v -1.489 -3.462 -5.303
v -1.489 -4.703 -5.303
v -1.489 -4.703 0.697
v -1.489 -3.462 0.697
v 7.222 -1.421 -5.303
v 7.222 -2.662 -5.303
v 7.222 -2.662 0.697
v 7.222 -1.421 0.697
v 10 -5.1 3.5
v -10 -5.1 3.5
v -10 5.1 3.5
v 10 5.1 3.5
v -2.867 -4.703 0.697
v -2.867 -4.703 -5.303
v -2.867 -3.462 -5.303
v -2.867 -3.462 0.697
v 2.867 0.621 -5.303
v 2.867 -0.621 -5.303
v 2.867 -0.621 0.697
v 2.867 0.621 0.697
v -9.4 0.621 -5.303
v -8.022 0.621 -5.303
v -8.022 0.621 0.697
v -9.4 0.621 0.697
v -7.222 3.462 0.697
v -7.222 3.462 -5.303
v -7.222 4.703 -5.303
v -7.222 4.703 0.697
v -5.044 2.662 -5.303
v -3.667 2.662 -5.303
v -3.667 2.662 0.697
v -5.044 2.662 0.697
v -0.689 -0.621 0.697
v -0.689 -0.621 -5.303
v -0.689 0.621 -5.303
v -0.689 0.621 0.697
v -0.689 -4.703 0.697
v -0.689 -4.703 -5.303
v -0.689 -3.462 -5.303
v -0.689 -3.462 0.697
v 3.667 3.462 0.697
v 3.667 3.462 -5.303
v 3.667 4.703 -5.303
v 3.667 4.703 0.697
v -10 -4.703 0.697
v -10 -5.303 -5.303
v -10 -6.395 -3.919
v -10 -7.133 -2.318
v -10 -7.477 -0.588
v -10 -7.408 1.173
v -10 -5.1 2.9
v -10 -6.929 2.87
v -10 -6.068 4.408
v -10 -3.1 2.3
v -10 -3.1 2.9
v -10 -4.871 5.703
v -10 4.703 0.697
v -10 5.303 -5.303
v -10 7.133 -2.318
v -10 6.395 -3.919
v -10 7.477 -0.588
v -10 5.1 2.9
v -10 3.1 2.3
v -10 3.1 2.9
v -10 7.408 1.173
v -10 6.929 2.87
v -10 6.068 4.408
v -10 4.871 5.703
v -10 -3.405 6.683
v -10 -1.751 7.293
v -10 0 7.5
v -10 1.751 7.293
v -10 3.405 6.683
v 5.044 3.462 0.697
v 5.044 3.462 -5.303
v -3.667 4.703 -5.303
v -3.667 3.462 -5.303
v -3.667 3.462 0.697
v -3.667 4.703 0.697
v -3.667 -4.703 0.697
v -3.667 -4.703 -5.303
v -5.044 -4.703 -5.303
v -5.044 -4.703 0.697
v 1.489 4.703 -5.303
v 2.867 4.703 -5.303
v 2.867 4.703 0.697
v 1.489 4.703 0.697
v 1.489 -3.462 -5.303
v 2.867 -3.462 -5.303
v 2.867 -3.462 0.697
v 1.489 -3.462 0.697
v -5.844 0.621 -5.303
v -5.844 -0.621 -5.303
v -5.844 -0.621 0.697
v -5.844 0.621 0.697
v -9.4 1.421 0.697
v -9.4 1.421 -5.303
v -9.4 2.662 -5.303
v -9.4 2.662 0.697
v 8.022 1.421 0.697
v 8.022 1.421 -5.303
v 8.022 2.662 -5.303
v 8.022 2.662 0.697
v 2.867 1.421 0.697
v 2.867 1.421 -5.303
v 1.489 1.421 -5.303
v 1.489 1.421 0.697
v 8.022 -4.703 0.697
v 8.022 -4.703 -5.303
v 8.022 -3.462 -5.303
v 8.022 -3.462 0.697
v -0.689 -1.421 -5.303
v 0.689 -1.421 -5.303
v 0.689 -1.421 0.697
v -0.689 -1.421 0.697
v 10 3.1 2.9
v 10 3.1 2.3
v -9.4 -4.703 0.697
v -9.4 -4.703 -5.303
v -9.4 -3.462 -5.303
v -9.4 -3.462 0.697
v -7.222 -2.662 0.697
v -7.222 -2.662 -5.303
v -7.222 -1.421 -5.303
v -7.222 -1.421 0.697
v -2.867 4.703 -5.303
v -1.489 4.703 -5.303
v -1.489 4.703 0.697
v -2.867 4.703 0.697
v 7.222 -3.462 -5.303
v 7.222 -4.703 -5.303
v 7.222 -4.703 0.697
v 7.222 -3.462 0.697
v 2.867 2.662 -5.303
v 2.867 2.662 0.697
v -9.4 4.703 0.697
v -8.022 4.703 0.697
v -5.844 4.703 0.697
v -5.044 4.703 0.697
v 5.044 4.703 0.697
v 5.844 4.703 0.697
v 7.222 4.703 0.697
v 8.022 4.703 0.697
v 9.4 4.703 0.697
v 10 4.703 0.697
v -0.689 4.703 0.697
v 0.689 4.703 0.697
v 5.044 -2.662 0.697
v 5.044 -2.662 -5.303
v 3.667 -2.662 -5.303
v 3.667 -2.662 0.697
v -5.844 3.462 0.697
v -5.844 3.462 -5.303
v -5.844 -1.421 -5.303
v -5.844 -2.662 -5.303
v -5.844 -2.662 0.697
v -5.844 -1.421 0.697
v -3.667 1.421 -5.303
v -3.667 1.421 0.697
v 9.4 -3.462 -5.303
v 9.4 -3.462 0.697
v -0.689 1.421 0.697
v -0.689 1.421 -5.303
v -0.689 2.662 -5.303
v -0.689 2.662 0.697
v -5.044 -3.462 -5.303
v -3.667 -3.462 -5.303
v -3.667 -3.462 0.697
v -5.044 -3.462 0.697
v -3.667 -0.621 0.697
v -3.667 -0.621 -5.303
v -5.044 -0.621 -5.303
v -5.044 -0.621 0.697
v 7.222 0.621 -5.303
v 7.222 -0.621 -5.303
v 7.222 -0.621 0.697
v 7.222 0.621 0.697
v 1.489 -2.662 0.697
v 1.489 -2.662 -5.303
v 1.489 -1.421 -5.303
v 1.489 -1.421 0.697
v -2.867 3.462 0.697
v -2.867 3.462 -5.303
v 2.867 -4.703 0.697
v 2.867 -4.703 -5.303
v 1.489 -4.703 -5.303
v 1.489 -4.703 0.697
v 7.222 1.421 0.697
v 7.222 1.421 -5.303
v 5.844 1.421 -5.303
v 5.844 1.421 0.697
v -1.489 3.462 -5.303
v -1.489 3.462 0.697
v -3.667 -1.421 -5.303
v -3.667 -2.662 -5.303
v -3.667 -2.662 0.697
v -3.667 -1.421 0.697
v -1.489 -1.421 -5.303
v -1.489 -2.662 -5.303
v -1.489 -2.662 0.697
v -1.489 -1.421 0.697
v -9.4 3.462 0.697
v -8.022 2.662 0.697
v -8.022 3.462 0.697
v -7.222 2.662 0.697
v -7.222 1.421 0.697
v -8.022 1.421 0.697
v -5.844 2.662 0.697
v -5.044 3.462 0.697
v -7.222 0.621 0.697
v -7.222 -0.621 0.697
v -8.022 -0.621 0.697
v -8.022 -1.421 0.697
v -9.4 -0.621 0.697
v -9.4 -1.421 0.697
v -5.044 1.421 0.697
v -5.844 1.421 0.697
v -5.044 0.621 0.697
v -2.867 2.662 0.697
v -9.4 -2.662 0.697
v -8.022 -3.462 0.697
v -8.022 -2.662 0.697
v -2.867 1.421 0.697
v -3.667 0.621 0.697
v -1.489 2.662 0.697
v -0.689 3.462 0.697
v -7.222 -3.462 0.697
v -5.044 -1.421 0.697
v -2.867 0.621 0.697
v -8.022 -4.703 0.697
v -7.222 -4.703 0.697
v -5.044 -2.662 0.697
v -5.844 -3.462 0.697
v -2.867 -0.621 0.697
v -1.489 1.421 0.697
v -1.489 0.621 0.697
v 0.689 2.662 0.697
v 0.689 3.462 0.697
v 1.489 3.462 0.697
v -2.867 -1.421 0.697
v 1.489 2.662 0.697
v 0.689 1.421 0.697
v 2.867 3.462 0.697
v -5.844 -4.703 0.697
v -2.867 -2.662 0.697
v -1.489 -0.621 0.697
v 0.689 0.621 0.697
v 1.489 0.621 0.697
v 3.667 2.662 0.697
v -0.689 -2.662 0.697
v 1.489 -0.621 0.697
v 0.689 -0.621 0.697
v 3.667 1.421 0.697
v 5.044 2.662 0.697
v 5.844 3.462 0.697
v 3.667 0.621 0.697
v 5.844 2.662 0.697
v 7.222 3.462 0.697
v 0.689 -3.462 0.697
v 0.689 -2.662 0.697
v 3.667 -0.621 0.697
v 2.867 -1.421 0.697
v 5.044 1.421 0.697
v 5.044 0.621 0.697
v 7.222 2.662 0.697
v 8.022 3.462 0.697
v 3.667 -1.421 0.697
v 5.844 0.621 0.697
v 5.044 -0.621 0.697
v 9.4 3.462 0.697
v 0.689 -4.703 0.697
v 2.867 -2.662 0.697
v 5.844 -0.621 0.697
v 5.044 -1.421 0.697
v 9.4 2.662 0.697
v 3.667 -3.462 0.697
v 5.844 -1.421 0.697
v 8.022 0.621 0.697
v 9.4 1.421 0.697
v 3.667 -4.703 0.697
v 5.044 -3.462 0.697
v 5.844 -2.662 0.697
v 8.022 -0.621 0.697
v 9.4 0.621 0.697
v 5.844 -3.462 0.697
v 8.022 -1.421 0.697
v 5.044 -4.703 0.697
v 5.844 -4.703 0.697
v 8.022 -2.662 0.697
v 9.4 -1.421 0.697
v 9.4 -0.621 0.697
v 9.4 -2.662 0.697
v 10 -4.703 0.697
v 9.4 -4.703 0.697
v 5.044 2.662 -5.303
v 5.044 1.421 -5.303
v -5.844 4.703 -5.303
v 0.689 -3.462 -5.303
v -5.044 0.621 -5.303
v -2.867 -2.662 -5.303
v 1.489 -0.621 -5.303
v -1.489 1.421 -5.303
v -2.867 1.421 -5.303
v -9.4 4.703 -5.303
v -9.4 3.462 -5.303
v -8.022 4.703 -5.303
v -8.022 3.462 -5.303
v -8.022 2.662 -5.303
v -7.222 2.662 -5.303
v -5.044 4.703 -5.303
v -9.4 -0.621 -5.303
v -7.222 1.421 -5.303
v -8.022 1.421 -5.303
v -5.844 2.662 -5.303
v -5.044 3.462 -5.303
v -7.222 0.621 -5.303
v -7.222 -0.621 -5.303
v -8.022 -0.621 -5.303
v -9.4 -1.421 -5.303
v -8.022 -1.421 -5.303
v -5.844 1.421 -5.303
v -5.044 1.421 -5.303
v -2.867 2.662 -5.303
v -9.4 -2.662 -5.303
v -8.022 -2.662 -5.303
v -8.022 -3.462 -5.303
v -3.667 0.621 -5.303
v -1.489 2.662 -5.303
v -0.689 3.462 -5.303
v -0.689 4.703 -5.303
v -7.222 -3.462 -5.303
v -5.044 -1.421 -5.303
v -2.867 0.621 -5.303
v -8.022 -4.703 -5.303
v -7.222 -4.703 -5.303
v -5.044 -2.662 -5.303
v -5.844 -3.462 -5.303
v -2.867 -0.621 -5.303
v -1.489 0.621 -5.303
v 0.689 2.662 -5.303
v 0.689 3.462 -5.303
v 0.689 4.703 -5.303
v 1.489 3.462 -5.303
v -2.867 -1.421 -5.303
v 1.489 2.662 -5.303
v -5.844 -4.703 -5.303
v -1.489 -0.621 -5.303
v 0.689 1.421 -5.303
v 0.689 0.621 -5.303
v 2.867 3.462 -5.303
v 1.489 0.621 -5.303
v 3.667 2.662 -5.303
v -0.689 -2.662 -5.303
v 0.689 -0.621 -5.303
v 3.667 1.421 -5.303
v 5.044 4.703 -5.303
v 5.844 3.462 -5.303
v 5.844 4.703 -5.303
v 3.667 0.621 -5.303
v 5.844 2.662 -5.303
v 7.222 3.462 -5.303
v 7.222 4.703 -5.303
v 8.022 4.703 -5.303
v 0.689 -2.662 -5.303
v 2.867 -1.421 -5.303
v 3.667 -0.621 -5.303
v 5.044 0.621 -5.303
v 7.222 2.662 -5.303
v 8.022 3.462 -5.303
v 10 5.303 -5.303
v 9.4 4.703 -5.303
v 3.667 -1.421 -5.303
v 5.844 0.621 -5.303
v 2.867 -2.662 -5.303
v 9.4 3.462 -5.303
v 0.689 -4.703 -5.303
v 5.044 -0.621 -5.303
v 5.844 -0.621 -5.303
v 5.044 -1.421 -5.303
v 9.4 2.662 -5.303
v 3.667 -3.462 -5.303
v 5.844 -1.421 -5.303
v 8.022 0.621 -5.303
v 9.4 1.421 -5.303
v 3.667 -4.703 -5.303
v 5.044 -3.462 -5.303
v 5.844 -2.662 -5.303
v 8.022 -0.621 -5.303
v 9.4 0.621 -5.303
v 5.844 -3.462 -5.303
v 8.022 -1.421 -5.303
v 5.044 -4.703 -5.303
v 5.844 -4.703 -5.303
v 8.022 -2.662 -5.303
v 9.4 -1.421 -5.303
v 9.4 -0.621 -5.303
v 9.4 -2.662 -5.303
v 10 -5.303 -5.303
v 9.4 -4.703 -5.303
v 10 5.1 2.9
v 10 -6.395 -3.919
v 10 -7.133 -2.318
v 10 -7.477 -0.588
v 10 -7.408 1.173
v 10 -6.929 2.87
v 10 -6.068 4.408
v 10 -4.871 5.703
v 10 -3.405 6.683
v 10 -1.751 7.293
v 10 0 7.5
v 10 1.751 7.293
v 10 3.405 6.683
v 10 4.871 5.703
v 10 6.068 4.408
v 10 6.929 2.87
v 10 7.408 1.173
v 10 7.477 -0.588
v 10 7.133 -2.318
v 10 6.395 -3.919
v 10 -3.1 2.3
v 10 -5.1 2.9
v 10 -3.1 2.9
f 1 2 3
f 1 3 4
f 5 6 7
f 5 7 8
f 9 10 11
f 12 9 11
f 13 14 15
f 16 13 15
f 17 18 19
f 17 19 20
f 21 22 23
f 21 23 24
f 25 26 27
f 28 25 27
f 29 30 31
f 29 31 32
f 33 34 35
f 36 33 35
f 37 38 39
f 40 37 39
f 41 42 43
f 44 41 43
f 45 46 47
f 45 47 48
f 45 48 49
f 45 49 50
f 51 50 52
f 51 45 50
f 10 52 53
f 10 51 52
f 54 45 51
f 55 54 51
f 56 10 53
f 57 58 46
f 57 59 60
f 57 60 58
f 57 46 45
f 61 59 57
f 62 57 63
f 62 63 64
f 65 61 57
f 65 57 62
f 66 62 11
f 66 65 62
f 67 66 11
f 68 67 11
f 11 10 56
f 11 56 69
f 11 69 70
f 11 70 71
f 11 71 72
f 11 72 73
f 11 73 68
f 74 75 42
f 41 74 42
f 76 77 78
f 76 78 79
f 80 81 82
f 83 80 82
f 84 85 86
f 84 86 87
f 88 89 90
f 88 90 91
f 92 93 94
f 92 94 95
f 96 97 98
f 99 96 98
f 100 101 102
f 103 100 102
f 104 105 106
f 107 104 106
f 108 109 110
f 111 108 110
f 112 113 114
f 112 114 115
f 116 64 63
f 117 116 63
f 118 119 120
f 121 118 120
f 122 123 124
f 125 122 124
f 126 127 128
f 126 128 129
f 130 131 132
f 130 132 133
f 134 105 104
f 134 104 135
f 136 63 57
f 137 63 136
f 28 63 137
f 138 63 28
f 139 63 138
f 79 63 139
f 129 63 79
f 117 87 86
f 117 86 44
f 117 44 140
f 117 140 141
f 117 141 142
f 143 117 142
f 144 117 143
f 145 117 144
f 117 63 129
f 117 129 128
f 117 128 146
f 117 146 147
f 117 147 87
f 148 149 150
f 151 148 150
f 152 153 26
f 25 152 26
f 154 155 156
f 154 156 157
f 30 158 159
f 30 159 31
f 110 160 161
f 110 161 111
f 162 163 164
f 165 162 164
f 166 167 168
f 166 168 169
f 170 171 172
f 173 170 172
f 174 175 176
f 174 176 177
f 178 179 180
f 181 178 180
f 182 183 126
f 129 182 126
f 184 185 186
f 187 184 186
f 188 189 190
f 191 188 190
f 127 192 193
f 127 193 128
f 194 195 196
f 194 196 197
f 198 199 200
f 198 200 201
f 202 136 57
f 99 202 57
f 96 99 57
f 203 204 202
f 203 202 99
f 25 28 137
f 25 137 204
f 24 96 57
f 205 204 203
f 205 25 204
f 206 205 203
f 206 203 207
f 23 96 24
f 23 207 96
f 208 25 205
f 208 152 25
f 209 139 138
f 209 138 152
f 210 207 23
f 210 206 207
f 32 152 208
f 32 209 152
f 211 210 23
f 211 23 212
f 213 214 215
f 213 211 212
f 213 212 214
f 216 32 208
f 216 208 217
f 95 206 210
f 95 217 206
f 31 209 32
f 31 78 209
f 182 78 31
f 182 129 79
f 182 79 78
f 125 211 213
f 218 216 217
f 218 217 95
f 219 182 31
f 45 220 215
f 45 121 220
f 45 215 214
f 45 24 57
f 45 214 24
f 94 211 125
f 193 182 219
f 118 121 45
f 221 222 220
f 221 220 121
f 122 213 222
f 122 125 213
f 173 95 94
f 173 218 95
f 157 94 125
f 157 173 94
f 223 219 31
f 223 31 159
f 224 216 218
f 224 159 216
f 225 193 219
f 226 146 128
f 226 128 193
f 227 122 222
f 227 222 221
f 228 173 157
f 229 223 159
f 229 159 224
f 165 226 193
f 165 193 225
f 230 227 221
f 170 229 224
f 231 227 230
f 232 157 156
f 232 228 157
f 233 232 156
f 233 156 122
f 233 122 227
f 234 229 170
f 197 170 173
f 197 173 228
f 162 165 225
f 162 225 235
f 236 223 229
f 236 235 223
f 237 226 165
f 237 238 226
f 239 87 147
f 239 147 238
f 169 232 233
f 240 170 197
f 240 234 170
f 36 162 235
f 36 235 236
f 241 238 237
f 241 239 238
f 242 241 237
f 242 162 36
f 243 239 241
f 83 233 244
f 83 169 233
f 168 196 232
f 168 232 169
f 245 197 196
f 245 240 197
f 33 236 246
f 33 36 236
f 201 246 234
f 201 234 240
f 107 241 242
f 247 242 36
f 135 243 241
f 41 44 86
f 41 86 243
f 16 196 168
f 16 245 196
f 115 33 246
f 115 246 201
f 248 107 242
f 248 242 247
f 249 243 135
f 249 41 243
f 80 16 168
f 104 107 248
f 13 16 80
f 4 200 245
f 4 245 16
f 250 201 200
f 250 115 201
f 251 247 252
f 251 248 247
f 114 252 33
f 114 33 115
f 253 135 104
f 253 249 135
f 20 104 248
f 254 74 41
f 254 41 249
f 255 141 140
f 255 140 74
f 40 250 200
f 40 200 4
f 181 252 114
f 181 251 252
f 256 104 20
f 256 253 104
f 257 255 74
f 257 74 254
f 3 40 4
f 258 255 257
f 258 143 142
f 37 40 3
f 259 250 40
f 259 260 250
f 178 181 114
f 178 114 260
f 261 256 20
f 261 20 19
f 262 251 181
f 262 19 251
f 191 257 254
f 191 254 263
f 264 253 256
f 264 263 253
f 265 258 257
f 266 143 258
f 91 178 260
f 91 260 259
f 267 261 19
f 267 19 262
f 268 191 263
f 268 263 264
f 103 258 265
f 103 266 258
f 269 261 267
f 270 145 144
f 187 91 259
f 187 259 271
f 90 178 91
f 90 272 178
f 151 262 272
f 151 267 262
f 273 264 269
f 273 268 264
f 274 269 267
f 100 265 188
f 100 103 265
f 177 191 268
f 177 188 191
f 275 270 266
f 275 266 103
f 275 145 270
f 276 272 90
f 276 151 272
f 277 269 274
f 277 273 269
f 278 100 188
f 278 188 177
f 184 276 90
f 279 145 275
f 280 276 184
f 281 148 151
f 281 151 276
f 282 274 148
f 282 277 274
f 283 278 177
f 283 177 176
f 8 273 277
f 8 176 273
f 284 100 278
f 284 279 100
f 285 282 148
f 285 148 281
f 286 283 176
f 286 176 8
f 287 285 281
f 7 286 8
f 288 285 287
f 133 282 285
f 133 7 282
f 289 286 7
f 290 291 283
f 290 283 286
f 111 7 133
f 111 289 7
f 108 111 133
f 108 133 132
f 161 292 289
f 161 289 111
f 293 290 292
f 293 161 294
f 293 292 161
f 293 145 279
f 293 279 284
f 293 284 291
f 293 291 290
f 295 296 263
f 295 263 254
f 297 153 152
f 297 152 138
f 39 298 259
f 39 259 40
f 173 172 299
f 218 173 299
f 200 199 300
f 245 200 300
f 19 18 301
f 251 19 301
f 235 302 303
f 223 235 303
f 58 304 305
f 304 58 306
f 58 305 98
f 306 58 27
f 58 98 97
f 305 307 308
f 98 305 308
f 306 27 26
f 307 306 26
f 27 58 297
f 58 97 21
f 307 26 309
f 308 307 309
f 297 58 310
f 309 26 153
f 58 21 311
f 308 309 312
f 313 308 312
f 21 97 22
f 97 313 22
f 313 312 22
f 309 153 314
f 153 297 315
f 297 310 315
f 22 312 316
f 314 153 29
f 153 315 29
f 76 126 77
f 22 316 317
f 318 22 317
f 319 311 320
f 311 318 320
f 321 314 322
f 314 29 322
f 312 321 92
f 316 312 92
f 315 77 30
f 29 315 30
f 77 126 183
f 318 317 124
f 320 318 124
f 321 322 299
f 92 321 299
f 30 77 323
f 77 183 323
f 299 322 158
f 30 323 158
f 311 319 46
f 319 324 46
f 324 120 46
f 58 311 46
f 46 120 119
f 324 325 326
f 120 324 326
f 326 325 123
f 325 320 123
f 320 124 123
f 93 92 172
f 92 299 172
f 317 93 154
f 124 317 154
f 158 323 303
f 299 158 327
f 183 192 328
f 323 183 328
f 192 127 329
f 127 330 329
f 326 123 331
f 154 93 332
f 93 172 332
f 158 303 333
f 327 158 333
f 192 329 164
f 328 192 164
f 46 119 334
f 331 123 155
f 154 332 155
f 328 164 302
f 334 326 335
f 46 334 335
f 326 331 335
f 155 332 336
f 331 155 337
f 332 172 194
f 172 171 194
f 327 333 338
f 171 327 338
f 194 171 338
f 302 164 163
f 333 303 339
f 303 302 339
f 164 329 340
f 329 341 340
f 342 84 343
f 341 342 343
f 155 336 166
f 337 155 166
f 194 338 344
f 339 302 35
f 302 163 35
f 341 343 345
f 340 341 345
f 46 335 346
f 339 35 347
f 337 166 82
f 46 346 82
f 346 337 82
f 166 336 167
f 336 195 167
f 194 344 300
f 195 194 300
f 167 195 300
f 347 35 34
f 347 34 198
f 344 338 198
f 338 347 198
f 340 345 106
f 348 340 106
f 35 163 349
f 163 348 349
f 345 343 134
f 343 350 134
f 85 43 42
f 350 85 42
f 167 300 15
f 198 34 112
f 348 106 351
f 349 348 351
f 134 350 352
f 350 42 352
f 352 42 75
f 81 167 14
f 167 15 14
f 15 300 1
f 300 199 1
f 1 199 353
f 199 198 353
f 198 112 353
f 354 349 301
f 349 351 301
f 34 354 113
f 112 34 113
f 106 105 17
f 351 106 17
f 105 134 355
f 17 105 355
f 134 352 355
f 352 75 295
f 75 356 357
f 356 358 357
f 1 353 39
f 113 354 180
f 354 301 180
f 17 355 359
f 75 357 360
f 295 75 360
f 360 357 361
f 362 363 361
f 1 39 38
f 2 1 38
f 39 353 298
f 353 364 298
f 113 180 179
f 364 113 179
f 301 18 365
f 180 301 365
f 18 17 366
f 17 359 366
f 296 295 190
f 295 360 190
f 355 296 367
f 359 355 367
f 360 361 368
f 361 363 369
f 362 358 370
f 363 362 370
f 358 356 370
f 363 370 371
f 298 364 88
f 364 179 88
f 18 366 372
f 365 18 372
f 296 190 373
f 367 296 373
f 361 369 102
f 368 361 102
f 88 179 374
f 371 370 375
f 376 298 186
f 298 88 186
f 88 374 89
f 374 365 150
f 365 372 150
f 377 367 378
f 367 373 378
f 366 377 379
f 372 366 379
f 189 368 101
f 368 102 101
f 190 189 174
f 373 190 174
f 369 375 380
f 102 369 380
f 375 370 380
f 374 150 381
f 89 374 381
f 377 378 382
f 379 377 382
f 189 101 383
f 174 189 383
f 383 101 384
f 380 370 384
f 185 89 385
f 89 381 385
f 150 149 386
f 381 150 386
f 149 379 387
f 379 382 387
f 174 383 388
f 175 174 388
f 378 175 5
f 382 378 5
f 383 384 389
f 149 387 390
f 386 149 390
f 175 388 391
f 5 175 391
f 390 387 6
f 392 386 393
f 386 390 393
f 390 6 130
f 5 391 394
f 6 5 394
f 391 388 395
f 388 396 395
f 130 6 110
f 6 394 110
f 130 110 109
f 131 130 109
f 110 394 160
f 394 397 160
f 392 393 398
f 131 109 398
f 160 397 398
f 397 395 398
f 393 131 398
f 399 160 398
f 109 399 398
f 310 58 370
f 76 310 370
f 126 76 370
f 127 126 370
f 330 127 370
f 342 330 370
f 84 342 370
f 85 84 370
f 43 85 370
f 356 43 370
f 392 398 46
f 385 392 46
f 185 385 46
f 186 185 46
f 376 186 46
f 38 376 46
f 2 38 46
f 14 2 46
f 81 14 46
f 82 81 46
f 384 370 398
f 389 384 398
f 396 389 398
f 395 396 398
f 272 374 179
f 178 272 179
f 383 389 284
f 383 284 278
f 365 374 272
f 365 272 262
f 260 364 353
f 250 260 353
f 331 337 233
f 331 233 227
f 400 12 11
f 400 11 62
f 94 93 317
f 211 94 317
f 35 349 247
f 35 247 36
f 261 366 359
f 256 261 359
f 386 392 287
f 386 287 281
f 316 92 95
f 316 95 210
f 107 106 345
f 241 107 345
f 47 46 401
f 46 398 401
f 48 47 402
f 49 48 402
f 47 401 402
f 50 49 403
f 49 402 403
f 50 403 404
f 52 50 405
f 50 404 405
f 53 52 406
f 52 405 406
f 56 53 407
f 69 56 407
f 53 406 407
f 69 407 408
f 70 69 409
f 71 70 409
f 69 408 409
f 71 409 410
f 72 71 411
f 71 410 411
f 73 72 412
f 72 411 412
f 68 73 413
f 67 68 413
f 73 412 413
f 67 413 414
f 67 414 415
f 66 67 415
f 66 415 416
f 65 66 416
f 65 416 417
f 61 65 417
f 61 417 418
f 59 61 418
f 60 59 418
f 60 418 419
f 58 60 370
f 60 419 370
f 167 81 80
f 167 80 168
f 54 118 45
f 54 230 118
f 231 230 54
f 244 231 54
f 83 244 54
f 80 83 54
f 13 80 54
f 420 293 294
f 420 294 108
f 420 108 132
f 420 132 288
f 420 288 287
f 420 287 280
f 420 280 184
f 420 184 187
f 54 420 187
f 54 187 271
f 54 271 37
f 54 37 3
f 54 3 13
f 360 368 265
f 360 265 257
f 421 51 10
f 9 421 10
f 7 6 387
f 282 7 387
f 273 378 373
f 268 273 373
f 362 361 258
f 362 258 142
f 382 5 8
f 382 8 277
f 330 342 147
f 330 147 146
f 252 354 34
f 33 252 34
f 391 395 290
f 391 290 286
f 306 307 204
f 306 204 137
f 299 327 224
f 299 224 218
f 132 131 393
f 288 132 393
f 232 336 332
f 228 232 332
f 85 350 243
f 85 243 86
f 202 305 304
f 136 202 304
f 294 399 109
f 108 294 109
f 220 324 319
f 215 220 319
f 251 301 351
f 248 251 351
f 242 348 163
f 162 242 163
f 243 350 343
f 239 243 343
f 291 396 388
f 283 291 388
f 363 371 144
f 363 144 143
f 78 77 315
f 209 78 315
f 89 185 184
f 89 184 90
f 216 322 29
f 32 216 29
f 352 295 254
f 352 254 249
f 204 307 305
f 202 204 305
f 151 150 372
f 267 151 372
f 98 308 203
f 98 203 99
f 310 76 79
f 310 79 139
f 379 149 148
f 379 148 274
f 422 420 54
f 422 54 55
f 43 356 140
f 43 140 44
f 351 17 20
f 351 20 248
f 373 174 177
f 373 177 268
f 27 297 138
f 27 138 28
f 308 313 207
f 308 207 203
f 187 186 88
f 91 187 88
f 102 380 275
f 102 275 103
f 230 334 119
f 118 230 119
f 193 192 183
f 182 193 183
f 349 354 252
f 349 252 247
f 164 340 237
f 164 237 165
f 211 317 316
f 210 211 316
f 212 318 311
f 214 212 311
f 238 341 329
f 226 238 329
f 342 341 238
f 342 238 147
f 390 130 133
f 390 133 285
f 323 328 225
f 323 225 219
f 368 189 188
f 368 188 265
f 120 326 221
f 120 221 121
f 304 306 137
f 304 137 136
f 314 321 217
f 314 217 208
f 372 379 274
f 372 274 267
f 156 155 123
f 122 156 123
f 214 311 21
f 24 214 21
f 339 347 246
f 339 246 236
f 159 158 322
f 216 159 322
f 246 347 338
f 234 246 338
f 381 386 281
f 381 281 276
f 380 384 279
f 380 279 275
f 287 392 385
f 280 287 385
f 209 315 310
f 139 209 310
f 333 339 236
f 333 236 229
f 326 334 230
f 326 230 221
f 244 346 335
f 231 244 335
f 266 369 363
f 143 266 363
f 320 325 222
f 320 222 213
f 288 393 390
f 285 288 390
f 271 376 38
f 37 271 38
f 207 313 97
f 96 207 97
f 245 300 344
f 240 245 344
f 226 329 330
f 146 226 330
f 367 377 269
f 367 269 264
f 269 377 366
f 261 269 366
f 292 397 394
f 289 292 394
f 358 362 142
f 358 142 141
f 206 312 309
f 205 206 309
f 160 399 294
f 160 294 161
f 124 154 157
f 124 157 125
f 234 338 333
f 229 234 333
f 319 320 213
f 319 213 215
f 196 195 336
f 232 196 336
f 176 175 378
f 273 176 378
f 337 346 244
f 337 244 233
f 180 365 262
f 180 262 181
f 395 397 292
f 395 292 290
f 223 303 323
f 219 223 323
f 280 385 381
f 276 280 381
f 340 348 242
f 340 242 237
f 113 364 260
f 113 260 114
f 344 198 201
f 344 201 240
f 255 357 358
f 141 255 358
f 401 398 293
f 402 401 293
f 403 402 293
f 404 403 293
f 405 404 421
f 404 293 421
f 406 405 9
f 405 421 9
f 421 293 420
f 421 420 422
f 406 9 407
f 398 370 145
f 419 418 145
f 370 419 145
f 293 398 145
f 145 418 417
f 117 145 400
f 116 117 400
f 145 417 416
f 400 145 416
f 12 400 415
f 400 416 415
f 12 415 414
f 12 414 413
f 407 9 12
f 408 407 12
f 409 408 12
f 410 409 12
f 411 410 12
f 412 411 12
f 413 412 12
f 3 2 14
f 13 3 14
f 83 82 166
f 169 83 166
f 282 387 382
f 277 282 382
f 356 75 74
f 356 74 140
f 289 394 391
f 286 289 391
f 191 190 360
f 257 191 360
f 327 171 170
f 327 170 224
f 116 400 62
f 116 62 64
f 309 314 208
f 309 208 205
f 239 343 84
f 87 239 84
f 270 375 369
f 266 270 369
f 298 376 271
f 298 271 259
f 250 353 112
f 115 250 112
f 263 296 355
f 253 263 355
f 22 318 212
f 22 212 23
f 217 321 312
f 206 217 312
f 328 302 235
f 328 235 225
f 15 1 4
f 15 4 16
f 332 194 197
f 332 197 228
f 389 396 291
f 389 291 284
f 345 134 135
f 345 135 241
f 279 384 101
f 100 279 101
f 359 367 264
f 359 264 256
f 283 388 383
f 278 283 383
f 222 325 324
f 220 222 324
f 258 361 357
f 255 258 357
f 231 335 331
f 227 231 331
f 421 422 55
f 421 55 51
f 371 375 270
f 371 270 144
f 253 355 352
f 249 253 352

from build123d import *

# Parameters (mm, degrees)
BOSS_EXTRUDE1_DEPTH = 10
SKETCH2_W           = 1.377777778
SKETCH2_H           = 1.241320344
SKETCH2_H_2         = 1.241320343
SKETCH2_W_2         = 1.377777777
CUT_EXTRUDE1_DEPTH  = 6


with BuildPart() as part:
    # Sketch1 → Boss-Extrude1 (new body, symmetric)
    with BuildSketch(Plane(origin=(0, 0, 0), x_dir=(0, 0, -1), z_dir=(1, 0, 0))):
        with BuildLine():
            Line((5.303300859, 5.303300859), (5.303300859, -5.303300859))
            ThreePointArc((5.303300859, -5.303300859), (-7.5, 0), (5.303300859, 5.303300859))
        make_face()
        Polygon((-3.5, -5.1), (-3.5, 5.1), (-2.9, 5.1), (-2.9, 3.1), (-2.3, 3.1), (-0.696699141, 4.703300859), (-0.696699141, -4.703300859), (-2.3, -3.1), (-2.9, -3.1), (-2.9, -5.1), align=None, mode=Mode.SUBTRACT)
    extrude(amount=BOSS_EXTRUDE1_DEPTH, both=True)

    # Sketch2 → Cut-Extrude1 (cut)
    with BuildSketch(Plane(origin=(0, 0, -5.303300859), x_dir=(-1, 0, 0), z_dir=(0, 0, -1))):
        with Locations((-6.533333333, -4.082640687)):
            Rectangle(SKETCH2_W, SKETCH2_H)
        with Locations((-8.711111111, -4.082640687)):
            Rectangle(SKETCH2_W, SKETCH2_H)
        with Locations((-6.533333333, -2.041320344)):
            Rectangle(SKETCH2_W, SKETCH2_H_2)
        with Locations((-6.533333333, 0)):
            Rectangle(SKETCH2_W, SKETCH2_H)
        with Locations((-8.711111111, -2.041320344)):
            Rectangle(SKETCH2_W, SKETCH2_H_2)
        with Locations((-8.711111111, 0)):
            Rectangle(SKETCH2_W, SKETCH2_H)
        with Locations((-4.355555556, -4.082640687)):
            Rectangle(SKETCH2_W_2, SKETCH2_H)
        with Locations((-2.177777778, -4.082640687)):
            Rectangle(SKETCH2_W, SKETCH2_H)
        with Locations((0, -4.082640687)):
            Rectangle(SKETCH2_W, SKETCH2_H)
        with Locations((2.177777778, -4.082640687)):
            Rectangle(SKETCH2_W, SKETCH2_H)
        with Locations((4.355555556, -4.082640687)):
            Rectangle(SKETCH2_W_2, SKETCH2_H)
        with Locations((6.533333333, -4.082640687)):
            Rectangle(SKETCH2_W, SKETCH2_H)
        with Locations((8.711111111, -4.082640687)):
            Rectangle(SKETCH2_W, SKETCH2_H)
        with Locations((-4.355555556, -2.041320344)):
            Rectangle(SKETCH2_W_2, SKETCH2_H_2)
        with Locations((-2.177777778, -2.041320344)):
            Rectangle(SKETCH2_W, SKETCH2_H_2)
        with Locations((0, -2.041320344)):
            Rectangle(SKETCH2_W, SKETCH2_H_2)
        with Locations((2.177777778, -2.041320344)):
            Rectangle(SKETCH2_W, SKETCH2_H_2)
        with Locations((4.355555556, -2.041320344)):
            Rectangle(SKETCH2_W_2, SKETCH2_H_2)
        with Locations((6.533333333, -2.041320344)):
            Rectangle(SKETCH2_W, SKETCH2_H_2)
        with Locations((8.711111111, -2.041320344)):
            Rectangle(SKETCH2_W, SKETCH2_H_2)
        with Locations((-4.355555556, 0)):
            Rectangle(SKETCH2_W_2, SKETCH2_H)
        with Locations((-2.177777778, 0)):
            Rectangle(SKETCH2_W, SKETCH2_H)
        Rectangle(SKETCH2_W, SKETCH2_H)
        with Locations((2.177777778, 0)):
            Rectangle(SKETCH2_W, SKETCH2_H)
        with Locations((4.355555556, 0)):
            Rectangle(SKETCH2_W_2, SKETCH2_H)
        with Locations((6.533333333, 0)):
            Rectangle(SKETCH2_W, SKETCH2_H)
        with Locations((8.711111111, 0)):
            Rectangle(SKETCH2_W, SKETCH2_H)
        with Locations((-8.711111111, 2.041320344)):
            Rectangle(SKETCH2_W, SKETCH2_H_2)
        with Locations((-6.533333333, 2.041320344)):
            Rectangle(SKETCH2_W, SKETCH2_H_2)
        with Locations((-4.355555556, 2.041320344)):
            Rectangle(SKETCH2_W_2, SKETCH2_H_2)
        with Locations((-2.177777778, 2.041320344)):
            Rectangle(SKETCH2_W, SKETCH2_H_2)
        with Locations((0, 2.041320344)):
            Rectangle(SKETCH2_W, SKETCH2_H_2)
        with Locations((2.177777778, 2.041320344)):
            Rectangle(SKETCH2_W, SKETCH2_H_2)
        with Locations((4.355555556, 2.041320344)):
            Rectangle(SKETCH2_W_2, SKETCH2_H_2)
        with Locations((6.533333333, 2.041320344)):
            Rectangle(SKETCH2_W, SKETCH2_H_2)
        with Locations((8.711111111, 2.041320344)):
            Rectangle(SKETCH2_W, SKETCH2_H_2)
        with Locations((-8.711111111, 4.082640687)):
            Rectangle(SKETCH2_W, SKETCH2_H)
        with Locations((-6.533333333, 4.082640687)):
            Rectangle(SKETCH2_W, SKETCH2_H)
        with Locations((-4.355555556, 4.082640687)):
            Rectangle(SKETCH2_W_2, SKETCH2_H)
        with Locations((-2.177777778, 4.082640687)):
            Rectangle(SKETCH2_W, SKETCH2_H)
        with Locations((0, 4.082640687)):
            Rectangle(SKETCH2_W, SKETCH2_H)
        with Locations((2.177777778, 4.082640687)):
            Rectangle(SKETCH2_W, SKETCH2_H)
        with Locations((4.355555556, 4.082640687)):
            Rectangle(SKETCH2_W_2, SKETCH2_H)
        with Locations((6.533333333, 4.082640687)):
            Rectangle(SKETCH2_W, SKETCH2_H)
        with Locations((8.711111111, 4.082640687)):
            Rectangle(SKETCH2_W, SKETCH2_H)
    extrude(amount=-CUT_EXTRUDE1_DEPTH, mode=Mode.SUBTRACT)


solid = part.part
